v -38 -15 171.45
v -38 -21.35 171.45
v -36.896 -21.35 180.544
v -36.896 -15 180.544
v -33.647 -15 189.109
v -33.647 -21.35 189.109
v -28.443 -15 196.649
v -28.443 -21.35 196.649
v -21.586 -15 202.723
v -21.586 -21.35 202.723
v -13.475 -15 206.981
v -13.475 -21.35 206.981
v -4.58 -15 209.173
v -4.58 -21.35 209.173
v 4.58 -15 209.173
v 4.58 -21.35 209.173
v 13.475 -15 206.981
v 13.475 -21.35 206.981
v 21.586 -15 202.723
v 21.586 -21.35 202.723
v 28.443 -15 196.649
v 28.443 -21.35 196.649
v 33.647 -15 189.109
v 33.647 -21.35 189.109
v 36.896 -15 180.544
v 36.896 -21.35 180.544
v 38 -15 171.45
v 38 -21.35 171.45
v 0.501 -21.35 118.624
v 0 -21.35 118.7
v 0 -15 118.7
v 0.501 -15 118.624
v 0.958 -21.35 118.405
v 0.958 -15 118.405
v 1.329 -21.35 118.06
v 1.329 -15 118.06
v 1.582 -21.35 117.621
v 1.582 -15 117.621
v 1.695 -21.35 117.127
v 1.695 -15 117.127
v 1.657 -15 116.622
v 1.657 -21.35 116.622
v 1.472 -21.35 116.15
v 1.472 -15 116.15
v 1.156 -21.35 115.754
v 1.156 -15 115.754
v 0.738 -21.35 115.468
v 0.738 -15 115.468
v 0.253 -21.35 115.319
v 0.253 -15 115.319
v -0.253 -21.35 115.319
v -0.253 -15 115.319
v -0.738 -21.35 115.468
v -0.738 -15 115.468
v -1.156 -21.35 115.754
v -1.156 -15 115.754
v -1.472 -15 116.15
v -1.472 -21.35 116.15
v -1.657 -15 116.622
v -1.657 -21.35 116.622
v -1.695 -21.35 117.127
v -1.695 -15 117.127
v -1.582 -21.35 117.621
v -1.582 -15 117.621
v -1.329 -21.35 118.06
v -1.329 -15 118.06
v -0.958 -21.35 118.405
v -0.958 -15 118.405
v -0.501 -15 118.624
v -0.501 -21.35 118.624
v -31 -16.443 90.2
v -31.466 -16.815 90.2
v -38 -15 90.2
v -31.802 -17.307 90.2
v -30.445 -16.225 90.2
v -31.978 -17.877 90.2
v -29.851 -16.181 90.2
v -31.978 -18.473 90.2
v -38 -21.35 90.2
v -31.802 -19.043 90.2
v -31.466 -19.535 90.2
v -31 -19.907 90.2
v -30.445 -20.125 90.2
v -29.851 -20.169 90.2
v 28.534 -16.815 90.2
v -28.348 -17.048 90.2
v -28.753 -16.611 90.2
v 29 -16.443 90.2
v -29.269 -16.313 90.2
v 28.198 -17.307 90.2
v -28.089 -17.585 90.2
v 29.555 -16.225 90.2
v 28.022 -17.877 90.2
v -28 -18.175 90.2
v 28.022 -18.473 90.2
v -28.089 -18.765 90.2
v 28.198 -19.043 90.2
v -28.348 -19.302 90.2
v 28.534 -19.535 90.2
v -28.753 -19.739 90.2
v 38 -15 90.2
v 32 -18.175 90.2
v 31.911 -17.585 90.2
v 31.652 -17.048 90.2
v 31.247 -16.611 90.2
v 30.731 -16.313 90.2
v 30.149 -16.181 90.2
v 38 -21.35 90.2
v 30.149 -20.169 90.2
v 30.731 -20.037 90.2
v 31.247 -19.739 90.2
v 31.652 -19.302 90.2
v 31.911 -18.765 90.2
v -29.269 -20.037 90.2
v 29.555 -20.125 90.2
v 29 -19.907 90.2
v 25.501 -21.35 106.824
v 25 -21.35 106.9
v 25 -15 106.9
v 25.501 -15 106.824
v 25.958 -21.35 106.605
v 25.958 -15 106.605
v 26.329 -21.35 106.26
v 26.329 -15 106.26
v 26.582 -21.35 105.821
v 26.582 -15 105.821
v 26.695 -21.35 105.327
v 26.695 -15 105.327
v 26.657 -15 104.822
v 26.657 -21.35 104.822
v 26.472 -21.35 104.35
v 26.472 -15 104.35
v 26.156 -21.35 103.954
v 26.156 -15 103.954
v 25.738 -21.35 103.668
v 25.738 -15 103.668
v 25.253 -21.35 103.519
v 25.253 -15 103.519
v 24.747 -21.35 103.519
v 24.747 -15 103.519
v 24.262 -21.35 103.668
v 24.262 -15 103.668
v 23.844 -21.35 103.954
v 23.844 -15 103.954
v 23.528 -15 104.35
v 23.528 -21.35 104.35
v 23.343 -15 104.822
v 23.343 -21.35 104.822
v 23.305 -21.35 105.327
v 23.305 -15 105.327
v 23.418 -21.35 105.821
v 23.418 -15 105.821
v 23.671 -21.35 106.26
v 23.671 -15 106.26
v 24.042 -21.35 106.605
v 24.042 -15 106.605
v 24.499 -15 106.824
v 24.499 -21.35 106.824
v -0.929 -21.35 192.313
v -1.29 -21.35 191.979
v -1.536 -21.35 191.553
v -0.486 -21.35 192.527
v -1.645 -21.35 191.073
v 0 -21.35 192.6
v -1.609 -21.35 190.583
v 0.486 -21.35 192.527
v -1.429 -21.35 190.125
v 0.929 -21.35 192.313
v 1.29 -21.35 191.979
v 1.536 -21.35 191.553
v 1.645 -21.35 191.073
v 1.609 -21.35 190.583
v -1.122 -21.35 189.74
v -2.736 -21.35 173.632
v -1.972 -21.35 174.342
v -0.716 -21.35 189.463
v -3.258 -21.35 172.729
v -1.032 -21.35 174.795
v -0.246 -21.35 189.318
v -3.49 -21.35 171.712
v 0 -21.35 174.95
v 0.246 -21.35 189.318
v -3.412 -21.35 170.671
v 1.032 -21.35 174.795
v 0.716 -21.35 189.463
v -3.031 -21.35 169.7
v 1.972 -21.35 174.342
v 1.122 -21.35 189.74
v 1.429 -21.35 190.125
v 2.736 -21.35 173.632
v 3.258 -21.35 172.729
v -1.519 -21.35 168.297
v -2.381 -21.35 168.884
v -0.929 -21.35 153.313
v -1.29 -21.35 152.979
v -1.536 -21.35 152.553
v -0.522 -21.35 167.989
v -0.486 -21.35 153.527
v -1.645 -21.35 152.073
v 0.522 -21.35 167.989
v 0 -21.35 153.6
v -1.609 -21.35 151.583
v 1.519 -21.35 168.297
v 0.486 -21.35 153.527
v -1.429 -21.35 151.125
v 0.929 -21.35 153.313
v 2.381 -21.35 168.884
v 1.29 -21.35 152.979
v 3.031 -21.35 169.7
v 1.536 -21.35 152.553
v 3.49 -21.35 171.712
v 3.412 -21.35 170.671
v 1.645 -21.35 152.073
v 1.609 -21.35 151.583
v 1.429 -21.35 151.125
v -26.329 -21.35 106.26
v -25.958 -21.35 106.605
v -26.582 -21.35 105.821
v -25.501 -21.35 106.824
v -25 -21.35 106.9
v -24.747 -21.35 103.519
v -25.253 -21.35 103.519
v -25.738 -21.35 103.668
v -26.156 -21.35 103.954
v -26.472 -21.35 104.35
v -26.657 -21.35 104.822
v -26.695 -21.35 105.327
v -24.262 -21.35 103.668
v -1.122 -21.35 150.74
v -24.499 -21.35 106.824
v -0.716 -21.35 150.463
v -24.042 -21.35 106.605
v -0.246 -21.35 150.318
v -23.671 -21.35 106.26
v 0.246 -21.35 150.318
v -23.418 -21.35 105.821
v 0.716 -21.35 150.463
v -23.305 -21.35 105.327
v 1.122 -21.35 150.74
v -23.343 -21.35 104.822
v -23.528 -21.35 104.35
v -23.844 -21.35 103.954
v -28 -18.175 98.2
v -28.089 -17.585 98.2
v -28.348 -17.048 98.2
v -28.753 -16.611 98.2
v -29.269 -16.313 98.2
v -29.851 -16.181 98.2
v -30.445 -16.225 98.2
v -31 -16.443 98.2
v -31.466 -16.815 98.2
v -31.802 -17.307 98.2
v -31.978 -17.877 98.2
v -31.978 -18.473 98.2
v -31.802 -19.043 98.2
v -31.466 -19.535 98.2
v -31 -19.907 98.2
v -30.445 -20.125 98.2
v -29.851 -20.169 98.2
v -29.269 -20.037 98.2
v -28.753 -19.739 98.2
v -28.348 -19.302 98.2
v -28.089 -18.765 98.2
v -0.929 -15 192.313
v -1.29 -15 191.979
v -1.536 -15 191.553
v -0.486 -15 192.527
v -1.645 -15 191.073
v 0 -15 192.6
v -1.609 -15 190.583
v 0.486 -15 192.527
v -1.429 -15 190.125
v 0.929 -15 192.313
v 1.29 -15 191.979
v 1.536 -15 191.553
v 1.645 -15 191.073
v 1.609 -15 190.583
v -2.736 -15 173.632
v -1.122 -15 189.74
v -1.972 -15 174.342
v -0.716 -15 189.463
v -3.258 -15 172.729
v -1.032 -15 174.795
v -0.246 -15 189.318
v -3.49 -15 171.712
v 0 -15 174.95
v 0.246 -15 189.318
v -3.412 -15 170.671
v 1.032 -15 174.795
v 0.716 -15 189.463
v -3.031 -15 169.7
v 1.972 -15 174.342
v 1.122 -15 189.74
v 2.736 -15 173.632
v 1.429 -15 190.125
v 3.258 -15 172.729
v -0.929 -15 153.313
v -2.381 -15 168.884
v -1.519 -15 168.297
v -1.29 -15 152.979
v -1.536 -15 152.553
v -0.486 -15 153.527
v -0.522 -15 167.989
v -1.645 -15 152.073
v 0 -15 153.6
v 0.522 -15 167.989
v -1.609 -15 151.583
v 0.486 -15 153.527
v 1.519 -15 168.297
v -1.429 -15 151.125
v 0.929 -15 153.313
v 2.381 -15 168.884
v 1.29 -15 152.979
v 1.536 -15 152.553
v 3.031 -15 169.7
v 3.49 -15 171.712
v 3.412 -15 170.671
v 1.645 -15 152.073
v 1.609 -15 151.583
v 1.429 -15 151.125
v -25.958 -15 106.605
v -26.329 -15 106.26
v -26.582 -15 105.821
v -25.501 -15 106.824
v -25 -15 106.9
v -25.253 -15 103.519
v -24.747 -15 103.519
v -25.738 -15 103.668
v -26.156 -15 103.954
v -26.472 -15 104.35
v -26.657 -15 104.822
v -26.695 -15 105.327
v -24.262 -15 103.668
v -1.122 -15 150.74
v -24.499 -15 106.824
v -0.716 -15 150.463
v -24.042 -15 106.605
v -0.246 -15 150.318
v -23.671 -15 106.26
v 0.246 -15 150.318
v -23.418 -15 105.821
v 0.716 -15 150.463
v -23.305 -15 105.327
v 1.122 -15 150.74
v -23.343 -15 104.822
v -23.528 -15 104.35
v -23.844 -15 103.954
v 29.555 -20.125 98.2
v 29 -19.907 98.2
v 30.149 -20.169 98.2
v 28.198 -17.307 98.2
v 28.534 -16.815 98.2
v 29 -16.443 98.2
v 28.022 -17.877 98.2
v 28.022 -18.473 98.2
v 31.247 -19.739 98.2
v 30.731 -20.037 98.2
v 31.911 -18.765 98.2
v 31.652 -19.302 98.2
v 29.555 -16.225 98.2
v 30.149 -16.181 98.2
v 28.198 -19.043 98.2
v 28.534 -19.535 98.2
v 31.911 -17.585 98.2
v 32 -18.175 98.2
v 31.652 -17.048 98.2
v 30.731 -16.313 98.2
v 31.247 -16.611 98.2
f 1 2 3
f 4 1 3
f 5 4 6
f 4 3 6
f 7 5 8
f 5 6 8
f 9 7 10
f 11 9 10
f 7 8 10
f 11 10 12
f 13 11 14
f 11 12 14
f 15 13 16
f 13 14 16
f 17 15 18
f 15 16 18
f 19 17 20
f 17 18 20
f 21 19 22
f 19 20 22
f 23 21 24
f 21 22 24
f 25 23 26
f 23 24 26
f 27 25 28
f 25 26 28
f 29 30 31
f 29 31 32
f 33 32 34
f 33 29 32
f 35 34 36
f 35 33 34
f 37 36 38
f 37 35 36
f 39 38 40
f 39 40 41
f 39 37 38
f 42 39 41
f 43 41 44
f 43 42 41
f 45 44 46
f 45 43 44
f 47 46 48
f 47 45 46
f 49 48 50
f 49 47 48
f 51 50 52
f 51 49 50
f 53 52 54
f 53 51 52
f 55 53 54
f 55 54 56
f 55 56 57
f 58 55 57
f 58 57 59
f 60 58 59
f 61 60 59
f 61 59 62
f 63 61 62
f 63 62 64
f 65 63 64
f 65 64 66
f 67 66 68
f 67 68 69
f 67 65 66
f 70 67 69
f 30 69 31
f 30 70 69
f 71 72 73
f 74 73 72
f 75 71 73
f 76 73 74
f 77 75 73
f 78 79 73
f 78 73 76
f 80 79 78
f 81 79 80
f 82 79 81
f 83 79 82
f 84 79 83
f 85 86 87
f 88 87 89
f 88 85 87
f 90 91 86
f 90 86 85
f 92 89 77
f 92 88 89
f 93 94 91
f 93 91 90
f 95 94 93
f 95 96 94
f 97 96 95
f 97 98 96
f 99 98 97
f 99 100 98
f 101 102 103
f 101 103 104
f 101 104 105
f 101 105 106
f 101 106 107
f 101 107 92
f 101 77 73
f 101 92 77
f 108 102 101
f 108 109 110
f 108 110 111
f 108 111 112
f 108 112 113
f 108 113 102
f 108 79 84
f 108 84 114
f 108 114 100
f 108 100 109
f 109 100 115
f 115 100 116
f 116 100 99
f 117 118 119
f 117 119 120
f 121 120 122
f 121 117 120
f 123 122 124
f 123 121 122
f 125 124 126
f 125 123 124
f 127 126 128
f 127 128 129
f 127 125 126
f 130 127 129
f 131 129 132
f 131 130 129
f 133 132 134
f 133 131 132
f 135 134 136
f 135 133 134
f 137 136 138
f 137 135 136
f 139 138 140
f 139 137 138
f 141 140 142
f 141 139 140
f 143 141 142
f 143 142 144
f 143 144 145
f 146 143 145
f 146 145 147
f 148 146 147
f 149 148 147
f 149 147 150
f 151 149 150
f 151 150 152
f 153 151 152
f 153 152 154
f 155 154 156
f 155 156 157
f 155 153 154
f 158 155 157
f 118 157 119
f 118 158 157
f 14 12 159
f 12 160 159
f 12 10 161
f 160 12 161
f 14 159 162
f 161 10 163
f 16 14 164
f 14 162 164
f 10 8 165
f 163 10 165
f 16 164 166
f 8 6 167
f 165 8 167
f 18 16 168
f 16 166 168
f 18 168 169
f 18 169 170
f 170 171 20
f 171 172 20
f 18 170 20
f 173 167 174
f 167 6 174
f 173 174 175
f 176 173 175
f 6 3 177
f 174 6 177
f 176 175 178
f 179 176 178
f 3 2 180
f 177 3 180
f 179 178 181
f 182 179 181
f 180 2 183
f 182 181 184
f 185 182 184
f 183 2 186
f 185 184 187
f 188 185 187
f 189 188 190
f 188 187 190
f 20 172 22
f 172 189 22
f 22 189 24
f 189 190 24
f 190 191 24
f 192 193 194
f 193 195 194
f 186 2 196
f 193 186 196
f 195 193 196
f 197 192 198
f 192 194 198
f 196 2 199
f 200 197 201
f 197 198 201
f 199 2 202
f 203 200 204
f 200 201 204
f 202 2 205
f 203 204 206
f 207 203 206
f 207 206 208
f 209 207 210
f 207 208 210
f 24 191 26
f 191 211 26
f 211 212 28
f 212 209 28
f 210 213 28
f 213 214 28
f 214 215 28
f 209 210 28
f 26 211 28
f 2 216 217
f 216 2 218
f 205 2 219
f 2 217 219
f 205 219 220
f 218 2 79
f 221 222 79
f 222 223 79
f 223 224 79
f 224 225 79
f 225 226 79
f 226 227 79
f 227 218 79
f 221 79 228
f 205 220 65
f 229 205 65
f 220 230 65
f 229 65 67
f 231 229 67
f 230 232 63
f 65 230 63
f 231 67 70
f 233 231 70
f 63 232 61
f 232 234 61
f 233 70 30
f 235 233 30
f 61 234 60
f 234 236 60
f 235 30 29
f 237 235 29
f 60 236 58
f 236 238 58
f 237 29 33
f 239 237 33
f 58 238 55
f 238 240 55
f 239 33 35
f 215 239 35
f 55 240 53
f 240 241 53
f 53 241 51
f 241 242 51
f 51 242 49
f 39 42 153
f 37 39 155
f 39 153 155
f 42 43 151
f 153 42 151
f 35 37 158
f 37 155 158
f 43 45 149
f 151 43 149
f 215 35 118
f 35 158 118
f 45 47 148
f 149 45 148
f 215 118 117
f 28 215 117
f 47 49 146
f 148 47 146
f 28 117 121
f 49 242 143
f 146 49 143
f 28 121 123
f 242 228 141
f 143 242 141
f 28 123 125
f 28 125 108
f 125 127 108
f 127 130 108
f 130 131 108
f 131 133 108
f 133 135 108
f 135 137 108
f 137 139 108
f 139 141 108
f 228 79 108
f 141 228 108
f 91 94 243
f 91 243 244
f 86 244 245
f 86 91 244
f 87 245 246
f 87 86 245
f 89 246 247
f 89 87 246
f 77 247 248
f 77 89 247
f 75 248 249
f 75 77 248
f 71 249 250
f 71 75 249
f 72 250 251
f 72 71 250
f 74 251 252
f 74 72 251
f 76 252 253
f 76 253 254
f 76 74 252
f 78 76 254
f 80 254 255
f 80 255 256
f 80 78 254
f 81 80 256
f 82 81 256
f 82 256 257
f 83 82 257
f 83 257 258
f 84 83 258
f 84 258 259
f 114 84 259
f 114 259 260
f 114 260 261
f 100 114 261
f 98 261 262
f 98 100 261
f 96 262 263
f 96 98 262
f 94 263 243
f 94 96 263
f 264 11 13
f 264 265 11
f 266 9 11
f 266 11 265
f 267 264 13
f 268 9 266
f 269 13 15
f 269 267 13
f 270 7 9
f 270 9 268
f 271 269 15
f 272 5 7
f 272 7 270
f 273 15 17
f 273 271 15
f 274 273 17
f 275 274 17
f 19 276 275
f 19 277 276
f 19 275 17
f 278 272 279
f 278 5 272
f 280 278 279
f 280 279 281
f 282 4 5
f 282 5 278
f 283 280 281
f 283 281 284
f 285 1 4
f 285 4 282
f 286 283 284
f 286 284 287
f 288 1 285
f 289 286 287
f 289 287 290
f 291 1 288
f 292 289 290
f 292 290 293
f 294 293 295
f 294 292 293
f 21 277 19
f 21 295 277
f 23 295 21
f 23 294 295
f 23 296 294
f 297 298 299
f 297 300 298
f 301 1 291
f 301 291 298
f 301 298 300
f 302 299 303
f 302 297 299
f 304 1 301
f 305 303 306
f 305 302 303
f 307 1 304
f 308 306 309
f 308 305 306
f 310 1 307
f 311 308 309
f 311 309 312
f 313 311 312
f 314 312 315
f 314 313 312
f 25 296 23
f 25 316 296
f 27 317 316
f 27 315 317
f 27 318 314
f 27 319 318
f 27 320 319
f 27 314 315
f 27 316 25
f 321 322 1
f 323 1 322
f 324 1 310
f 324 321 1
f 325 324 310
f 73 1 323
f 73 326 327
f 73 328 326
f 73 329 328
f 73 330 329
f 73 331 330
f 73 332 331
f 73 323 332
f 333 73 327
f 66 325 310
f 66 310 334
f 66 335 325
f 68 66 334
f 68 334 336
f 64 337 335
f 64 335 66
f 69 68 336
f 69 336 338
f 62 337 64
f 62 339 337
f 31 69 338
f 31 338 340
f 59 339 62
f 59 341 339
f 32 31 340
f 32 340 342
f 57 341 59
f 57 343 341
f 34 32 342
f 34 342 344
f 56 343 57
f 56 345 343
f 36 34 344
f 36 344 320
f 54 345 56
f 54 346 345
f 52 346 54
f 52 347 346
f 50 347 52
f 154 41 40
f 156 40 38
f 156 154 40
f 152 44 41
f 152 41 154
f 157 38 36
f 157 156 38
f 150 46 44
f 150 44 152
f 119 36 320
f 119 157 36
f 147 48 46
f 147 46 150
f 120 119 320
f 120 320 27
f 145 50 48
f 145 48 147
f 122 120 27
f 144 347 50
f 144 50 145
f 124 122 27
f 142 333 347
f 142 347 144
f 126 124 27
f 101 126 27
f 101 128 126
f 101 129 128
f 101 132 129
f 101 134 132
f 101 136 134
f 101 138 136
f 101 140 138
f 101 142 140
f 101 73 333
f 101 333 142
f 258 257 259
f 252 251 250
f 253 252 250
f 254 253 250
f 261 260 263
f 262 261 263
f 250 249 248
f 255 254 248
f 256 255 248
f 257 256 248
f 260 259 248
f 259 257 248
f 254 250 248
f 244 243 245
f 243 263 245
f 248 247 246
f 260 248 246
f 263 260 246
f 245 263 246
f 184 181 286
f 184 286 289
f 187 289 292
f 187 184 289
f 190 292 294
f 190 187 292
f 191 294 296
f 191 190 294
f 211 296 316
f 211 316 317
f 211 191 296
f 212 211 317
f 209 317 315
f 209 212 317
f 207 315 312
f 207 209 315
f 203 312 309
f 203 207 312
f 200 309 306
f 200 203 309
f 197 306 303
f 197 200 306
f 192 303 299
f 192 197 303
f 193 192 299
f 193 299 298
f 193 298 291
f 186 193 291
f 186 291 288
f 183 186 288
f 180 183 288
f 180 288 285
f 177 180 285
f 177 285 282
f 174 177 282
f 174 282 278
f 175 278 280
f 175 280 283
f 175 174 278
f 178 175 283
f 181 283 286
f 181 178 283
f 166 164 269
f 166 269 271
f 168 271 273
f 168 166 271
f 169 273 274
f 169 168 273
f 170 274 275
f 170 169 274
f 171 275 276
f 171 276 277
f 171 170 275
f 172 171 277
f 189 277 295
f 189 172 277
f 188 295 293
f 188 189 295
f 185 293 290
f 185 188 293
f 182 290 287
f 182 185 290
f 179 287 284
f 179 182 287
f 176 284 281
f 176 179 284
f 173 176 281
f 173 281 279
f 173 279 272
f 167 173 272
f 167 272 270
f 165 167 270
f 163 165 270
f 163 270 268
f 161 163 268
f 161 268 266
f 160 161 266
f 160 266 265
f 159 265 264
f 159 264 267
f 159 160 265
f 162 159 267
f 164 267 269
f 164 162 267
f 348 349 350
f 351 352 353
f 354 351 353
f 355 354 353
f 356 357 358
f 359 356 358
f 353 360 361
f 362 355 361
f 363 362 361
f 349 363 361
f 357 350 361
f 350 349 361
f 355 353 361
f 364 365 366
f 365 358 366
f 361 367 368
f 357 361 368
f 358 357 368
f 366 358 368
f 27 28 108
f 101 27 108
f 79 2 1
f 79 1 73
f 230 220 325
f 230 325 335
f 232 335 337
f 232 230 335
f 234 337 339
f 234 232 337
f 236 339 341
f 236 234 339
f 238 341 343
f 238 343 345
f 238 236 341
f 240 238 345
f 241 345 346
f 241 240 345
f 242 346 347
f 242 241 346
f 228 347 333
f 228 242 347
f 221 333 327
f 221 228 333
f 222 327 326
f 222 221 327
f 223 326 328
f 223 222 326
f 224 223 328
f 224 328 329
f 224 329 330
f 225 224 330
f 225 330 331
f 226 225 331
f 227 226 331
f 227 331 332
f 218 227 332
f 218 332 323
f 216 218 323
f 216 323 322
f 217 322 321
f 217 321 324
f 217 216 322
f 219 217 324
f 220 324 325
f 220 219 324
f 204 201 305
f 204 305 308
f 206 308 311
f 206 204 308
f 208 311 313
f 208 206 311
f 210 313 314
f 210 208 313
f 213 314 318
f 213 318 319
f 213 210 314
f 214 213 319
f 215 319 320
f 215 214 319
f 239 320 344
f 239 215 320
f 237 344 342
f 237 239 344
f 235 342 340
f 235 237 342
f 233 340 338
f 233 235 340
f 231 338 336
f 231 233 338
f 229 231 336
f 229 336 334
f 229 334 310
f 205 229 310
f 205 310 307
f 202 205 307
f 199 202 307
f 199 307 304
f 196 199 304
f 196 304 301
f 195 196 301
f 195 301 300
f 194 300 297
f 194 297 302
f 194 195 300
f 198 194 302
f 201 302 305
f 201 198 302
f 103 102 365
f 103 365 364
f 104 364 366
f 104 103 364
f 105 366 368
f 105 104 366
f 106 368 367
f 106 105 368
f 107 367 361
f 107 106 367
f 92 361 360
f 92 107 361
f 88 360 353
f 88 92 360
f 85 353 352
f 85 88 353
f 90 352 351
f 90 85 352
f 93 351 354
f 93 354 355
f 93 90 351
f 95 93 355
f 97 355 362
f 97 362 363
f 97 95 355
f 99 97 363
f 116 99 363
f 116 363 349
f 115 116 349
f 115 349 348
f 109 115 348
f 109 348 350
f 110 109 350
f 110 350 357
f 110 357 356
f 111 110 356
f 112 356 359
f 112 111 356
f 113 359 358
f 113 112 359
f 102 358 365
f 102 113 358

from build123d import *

# Parameters (mm, degrees)
PARED_B_CHUMACERA_J2_START          = -21.35
CROQUIS1_W                          = 76
CROQUIS1_H                          = 81.25
PARED_B_CHUMACERA_J2_DEPTH          = 6.35
PARED_B_CHUMACERA_J2_REDONDEO_START = -21.35
CROQUIS2_R                          = 38
PARED_B_CHUMACERA_J2_REDONDEO_DEPTH = 6.35
PASO_PIN_Y_ROSCA_M4_EJEFALSO_START  = -21.35
CROQUIS3_R                          = 3.5
CROQUIS3_R_2                        = 1.65
PASO_PIN_Y_ROSCA_M4_EJEFALSO_DEPTH  = 6.35
ROSCA_M3_ESCUADRAS_START            = -21.35
CROQUIS4_R                          = 1.25
ROSCA_M3_ESCUADRAS_DEPTH            = 6.35
PASADORES_D4_START                  = 90.2
CROQUIS5_R                          = 2
PASADORES_D4_DEPTH                  = 8
ROSCA_M3_BASES_CINCHO_START         = -21.35
CROQUIS6_R                          = 1.25
ROSCA_M3_BASES_CINCHO_DEPTH         = 6.35
PASO_M3_ESCUADRAS_TUERCA_START      = -21.35
CROQUIS7_R                          = 1.7
PASO_M3_ESCUADRAS_TUERCA_DEPTH      = 6.35
PASO_M3_BASE_CINCHO_TUERCA_START    = -21.35
CROQUIS8_R                          = 1.7
PASO_M3_BASE_CINCHO_TUERCA_DEPTH    = 6.35


with BuildPart() as part:
    # Croquis1 → Pared_B_chumacera_J2 (new body)
    with BuildSketch(Plane(origin=(0, 0, 0), x_dir=(1, 0, 0), z_dir=(0, 1, 0)).offset(PARED_B_CHUMACERA_J2_START)):
        with Locations((0, -130.825)):
            Rectangle(CROQUIS1_W, CROQUIS1_H)
    extrude(amount=PARED_B_CHUMACERA_J2_DEPTH)

    # Croquis2 → Pared_B_chumacera_J2_redondeo (add)
    with BuildSketch(Plane(origin=(0, 0, 0), x_dir=(1, 0, 0), z_dir=(0, 1, 0)).offset(PARED_B_CHUMACERA_J2_REDONDEO_START)):
        with Locations((0, -171.45)):
            Circle(CROQUIS2_R)
    extrude(amount=PARED_B_CHUMACERA_J2_REDONDEO_DEPTH)

    # Croquis3 → Paso_pin_y_rosca_M4_ejefalso (cut)
    with BuildSketch(Plane(origin=(0, 0, 0), x_dir=(1, 0, 0), z_dir=(0, 1, 0)).offset(PASO_PIN_Y_ROSCA_M4_EJEFALSO_START)):
        with Locations(Location((0, -171.45, 0), (0, 0, 270))):
            Circle(CROQUIS3_R)
        with Locations(Location((0, -190.95, 0), (0, 0, 270))):
            Circle(CROQUIS3_R_2)
        with Locations(Location((0, -151.95, 0), (0, 0, 270))):
            Circle(CROQUIS3_R_2)
    extrude(amount=PASO_PIN_Y_ROSCA_M4_EJEFALSO_DEPTH, mode=Mode.SUBTRACT)

    # Croquis4 → Rosca_M3_escuadras (cut)
    with BuildSketch(Plane(origin=(0, 0, 0), x_dir=(1, 0, 0), z_dir=(0, 1, 0)).offset(ROSCA_M3_ESCUADRAS_START)):
        with Locations(Location((-25, -105.2, 0), (0, 0, 270))):
            Circle(CROQUIS4_R)
        with Locations(Location((25, -105.2, 0), (0, 0, 270))):
            Circle(CROQUIS4_R)
    extrude(amount=ROSCA_M3_ESCUADRAS_DEPTH, mode=Mode.SUBTRACT)

    # Croquis5 → Pasadores_D4 (cut)
    with BuildSketch(Plane.XY.offset(PASADORES_D4_START)):
        with Locations((-30, -18.175)):
            Circle(CROQUIS5_R)
        with Locations((30, -18.175)):
            Circle(CROQUIS5_R)
    extrude(amount=PASADORES_D4_DEPTH, mode=Mode.SUBTRACT)

    # Croquis6 → Rosca_M3_bases_cincho (cut)
    with BuildSketch(Plane(origin=(0, 0, 0), x_dir=(1, 0, 0), z_dir=(0, 1, 0)).offset(ROSCA_M3_BASES_CINCHO_START)):
        with Locations(Location((0, -117, 0), (0, 0, 270))):
            Circle(CROQUIS6_R)
    extrude(amount=ROSCA_M3_BASES_CINCHO_DEPTH, mode=Mode.SUBTRACT)

    # Croquis7 → Paso_M3_escuadras_tuerca (cut)
    with BuildSketch(Plane(origin=(0, 0, 0), x_dir=(1, 0, 0), z_dir=(0, 1, 0)).offset(PASO_M3_ESCUADRAS_TUERCA_START)):
        with Locations(Location((-25, -105.2, 0), (0, 0, 270))):
            Circle(CROQUIS7_R)
        with Locations(Location((25, -105.2, 0), (0, 0, 270))):
            Circle(CROQUIS7_R)
    extrude(amount=PASO_M3_ESCUADRAS_TUERCA_DEPTH, mode=Mode.SUBTRACT)

    # Croquis8 → Paso_M3_base_cincho_tuerca (cut)
    with BuildSketch(Plane(origin=(0, 0, 0), x_dir=(1, 0, 0), z_dir=(0, 1, 0)).offset(PASO_M3_BASE_CINCHO_TUERCA_START)):
        with Locations(Location((0, -117, 0), (0, 0, 270))):
            Circle(CROQUIS8_R)
    extrude(amount=PASO_M3_BASE_CINCHO_TUERCA_DEPTH, mode=Mode.SUBTRACT)


solid = part.part
